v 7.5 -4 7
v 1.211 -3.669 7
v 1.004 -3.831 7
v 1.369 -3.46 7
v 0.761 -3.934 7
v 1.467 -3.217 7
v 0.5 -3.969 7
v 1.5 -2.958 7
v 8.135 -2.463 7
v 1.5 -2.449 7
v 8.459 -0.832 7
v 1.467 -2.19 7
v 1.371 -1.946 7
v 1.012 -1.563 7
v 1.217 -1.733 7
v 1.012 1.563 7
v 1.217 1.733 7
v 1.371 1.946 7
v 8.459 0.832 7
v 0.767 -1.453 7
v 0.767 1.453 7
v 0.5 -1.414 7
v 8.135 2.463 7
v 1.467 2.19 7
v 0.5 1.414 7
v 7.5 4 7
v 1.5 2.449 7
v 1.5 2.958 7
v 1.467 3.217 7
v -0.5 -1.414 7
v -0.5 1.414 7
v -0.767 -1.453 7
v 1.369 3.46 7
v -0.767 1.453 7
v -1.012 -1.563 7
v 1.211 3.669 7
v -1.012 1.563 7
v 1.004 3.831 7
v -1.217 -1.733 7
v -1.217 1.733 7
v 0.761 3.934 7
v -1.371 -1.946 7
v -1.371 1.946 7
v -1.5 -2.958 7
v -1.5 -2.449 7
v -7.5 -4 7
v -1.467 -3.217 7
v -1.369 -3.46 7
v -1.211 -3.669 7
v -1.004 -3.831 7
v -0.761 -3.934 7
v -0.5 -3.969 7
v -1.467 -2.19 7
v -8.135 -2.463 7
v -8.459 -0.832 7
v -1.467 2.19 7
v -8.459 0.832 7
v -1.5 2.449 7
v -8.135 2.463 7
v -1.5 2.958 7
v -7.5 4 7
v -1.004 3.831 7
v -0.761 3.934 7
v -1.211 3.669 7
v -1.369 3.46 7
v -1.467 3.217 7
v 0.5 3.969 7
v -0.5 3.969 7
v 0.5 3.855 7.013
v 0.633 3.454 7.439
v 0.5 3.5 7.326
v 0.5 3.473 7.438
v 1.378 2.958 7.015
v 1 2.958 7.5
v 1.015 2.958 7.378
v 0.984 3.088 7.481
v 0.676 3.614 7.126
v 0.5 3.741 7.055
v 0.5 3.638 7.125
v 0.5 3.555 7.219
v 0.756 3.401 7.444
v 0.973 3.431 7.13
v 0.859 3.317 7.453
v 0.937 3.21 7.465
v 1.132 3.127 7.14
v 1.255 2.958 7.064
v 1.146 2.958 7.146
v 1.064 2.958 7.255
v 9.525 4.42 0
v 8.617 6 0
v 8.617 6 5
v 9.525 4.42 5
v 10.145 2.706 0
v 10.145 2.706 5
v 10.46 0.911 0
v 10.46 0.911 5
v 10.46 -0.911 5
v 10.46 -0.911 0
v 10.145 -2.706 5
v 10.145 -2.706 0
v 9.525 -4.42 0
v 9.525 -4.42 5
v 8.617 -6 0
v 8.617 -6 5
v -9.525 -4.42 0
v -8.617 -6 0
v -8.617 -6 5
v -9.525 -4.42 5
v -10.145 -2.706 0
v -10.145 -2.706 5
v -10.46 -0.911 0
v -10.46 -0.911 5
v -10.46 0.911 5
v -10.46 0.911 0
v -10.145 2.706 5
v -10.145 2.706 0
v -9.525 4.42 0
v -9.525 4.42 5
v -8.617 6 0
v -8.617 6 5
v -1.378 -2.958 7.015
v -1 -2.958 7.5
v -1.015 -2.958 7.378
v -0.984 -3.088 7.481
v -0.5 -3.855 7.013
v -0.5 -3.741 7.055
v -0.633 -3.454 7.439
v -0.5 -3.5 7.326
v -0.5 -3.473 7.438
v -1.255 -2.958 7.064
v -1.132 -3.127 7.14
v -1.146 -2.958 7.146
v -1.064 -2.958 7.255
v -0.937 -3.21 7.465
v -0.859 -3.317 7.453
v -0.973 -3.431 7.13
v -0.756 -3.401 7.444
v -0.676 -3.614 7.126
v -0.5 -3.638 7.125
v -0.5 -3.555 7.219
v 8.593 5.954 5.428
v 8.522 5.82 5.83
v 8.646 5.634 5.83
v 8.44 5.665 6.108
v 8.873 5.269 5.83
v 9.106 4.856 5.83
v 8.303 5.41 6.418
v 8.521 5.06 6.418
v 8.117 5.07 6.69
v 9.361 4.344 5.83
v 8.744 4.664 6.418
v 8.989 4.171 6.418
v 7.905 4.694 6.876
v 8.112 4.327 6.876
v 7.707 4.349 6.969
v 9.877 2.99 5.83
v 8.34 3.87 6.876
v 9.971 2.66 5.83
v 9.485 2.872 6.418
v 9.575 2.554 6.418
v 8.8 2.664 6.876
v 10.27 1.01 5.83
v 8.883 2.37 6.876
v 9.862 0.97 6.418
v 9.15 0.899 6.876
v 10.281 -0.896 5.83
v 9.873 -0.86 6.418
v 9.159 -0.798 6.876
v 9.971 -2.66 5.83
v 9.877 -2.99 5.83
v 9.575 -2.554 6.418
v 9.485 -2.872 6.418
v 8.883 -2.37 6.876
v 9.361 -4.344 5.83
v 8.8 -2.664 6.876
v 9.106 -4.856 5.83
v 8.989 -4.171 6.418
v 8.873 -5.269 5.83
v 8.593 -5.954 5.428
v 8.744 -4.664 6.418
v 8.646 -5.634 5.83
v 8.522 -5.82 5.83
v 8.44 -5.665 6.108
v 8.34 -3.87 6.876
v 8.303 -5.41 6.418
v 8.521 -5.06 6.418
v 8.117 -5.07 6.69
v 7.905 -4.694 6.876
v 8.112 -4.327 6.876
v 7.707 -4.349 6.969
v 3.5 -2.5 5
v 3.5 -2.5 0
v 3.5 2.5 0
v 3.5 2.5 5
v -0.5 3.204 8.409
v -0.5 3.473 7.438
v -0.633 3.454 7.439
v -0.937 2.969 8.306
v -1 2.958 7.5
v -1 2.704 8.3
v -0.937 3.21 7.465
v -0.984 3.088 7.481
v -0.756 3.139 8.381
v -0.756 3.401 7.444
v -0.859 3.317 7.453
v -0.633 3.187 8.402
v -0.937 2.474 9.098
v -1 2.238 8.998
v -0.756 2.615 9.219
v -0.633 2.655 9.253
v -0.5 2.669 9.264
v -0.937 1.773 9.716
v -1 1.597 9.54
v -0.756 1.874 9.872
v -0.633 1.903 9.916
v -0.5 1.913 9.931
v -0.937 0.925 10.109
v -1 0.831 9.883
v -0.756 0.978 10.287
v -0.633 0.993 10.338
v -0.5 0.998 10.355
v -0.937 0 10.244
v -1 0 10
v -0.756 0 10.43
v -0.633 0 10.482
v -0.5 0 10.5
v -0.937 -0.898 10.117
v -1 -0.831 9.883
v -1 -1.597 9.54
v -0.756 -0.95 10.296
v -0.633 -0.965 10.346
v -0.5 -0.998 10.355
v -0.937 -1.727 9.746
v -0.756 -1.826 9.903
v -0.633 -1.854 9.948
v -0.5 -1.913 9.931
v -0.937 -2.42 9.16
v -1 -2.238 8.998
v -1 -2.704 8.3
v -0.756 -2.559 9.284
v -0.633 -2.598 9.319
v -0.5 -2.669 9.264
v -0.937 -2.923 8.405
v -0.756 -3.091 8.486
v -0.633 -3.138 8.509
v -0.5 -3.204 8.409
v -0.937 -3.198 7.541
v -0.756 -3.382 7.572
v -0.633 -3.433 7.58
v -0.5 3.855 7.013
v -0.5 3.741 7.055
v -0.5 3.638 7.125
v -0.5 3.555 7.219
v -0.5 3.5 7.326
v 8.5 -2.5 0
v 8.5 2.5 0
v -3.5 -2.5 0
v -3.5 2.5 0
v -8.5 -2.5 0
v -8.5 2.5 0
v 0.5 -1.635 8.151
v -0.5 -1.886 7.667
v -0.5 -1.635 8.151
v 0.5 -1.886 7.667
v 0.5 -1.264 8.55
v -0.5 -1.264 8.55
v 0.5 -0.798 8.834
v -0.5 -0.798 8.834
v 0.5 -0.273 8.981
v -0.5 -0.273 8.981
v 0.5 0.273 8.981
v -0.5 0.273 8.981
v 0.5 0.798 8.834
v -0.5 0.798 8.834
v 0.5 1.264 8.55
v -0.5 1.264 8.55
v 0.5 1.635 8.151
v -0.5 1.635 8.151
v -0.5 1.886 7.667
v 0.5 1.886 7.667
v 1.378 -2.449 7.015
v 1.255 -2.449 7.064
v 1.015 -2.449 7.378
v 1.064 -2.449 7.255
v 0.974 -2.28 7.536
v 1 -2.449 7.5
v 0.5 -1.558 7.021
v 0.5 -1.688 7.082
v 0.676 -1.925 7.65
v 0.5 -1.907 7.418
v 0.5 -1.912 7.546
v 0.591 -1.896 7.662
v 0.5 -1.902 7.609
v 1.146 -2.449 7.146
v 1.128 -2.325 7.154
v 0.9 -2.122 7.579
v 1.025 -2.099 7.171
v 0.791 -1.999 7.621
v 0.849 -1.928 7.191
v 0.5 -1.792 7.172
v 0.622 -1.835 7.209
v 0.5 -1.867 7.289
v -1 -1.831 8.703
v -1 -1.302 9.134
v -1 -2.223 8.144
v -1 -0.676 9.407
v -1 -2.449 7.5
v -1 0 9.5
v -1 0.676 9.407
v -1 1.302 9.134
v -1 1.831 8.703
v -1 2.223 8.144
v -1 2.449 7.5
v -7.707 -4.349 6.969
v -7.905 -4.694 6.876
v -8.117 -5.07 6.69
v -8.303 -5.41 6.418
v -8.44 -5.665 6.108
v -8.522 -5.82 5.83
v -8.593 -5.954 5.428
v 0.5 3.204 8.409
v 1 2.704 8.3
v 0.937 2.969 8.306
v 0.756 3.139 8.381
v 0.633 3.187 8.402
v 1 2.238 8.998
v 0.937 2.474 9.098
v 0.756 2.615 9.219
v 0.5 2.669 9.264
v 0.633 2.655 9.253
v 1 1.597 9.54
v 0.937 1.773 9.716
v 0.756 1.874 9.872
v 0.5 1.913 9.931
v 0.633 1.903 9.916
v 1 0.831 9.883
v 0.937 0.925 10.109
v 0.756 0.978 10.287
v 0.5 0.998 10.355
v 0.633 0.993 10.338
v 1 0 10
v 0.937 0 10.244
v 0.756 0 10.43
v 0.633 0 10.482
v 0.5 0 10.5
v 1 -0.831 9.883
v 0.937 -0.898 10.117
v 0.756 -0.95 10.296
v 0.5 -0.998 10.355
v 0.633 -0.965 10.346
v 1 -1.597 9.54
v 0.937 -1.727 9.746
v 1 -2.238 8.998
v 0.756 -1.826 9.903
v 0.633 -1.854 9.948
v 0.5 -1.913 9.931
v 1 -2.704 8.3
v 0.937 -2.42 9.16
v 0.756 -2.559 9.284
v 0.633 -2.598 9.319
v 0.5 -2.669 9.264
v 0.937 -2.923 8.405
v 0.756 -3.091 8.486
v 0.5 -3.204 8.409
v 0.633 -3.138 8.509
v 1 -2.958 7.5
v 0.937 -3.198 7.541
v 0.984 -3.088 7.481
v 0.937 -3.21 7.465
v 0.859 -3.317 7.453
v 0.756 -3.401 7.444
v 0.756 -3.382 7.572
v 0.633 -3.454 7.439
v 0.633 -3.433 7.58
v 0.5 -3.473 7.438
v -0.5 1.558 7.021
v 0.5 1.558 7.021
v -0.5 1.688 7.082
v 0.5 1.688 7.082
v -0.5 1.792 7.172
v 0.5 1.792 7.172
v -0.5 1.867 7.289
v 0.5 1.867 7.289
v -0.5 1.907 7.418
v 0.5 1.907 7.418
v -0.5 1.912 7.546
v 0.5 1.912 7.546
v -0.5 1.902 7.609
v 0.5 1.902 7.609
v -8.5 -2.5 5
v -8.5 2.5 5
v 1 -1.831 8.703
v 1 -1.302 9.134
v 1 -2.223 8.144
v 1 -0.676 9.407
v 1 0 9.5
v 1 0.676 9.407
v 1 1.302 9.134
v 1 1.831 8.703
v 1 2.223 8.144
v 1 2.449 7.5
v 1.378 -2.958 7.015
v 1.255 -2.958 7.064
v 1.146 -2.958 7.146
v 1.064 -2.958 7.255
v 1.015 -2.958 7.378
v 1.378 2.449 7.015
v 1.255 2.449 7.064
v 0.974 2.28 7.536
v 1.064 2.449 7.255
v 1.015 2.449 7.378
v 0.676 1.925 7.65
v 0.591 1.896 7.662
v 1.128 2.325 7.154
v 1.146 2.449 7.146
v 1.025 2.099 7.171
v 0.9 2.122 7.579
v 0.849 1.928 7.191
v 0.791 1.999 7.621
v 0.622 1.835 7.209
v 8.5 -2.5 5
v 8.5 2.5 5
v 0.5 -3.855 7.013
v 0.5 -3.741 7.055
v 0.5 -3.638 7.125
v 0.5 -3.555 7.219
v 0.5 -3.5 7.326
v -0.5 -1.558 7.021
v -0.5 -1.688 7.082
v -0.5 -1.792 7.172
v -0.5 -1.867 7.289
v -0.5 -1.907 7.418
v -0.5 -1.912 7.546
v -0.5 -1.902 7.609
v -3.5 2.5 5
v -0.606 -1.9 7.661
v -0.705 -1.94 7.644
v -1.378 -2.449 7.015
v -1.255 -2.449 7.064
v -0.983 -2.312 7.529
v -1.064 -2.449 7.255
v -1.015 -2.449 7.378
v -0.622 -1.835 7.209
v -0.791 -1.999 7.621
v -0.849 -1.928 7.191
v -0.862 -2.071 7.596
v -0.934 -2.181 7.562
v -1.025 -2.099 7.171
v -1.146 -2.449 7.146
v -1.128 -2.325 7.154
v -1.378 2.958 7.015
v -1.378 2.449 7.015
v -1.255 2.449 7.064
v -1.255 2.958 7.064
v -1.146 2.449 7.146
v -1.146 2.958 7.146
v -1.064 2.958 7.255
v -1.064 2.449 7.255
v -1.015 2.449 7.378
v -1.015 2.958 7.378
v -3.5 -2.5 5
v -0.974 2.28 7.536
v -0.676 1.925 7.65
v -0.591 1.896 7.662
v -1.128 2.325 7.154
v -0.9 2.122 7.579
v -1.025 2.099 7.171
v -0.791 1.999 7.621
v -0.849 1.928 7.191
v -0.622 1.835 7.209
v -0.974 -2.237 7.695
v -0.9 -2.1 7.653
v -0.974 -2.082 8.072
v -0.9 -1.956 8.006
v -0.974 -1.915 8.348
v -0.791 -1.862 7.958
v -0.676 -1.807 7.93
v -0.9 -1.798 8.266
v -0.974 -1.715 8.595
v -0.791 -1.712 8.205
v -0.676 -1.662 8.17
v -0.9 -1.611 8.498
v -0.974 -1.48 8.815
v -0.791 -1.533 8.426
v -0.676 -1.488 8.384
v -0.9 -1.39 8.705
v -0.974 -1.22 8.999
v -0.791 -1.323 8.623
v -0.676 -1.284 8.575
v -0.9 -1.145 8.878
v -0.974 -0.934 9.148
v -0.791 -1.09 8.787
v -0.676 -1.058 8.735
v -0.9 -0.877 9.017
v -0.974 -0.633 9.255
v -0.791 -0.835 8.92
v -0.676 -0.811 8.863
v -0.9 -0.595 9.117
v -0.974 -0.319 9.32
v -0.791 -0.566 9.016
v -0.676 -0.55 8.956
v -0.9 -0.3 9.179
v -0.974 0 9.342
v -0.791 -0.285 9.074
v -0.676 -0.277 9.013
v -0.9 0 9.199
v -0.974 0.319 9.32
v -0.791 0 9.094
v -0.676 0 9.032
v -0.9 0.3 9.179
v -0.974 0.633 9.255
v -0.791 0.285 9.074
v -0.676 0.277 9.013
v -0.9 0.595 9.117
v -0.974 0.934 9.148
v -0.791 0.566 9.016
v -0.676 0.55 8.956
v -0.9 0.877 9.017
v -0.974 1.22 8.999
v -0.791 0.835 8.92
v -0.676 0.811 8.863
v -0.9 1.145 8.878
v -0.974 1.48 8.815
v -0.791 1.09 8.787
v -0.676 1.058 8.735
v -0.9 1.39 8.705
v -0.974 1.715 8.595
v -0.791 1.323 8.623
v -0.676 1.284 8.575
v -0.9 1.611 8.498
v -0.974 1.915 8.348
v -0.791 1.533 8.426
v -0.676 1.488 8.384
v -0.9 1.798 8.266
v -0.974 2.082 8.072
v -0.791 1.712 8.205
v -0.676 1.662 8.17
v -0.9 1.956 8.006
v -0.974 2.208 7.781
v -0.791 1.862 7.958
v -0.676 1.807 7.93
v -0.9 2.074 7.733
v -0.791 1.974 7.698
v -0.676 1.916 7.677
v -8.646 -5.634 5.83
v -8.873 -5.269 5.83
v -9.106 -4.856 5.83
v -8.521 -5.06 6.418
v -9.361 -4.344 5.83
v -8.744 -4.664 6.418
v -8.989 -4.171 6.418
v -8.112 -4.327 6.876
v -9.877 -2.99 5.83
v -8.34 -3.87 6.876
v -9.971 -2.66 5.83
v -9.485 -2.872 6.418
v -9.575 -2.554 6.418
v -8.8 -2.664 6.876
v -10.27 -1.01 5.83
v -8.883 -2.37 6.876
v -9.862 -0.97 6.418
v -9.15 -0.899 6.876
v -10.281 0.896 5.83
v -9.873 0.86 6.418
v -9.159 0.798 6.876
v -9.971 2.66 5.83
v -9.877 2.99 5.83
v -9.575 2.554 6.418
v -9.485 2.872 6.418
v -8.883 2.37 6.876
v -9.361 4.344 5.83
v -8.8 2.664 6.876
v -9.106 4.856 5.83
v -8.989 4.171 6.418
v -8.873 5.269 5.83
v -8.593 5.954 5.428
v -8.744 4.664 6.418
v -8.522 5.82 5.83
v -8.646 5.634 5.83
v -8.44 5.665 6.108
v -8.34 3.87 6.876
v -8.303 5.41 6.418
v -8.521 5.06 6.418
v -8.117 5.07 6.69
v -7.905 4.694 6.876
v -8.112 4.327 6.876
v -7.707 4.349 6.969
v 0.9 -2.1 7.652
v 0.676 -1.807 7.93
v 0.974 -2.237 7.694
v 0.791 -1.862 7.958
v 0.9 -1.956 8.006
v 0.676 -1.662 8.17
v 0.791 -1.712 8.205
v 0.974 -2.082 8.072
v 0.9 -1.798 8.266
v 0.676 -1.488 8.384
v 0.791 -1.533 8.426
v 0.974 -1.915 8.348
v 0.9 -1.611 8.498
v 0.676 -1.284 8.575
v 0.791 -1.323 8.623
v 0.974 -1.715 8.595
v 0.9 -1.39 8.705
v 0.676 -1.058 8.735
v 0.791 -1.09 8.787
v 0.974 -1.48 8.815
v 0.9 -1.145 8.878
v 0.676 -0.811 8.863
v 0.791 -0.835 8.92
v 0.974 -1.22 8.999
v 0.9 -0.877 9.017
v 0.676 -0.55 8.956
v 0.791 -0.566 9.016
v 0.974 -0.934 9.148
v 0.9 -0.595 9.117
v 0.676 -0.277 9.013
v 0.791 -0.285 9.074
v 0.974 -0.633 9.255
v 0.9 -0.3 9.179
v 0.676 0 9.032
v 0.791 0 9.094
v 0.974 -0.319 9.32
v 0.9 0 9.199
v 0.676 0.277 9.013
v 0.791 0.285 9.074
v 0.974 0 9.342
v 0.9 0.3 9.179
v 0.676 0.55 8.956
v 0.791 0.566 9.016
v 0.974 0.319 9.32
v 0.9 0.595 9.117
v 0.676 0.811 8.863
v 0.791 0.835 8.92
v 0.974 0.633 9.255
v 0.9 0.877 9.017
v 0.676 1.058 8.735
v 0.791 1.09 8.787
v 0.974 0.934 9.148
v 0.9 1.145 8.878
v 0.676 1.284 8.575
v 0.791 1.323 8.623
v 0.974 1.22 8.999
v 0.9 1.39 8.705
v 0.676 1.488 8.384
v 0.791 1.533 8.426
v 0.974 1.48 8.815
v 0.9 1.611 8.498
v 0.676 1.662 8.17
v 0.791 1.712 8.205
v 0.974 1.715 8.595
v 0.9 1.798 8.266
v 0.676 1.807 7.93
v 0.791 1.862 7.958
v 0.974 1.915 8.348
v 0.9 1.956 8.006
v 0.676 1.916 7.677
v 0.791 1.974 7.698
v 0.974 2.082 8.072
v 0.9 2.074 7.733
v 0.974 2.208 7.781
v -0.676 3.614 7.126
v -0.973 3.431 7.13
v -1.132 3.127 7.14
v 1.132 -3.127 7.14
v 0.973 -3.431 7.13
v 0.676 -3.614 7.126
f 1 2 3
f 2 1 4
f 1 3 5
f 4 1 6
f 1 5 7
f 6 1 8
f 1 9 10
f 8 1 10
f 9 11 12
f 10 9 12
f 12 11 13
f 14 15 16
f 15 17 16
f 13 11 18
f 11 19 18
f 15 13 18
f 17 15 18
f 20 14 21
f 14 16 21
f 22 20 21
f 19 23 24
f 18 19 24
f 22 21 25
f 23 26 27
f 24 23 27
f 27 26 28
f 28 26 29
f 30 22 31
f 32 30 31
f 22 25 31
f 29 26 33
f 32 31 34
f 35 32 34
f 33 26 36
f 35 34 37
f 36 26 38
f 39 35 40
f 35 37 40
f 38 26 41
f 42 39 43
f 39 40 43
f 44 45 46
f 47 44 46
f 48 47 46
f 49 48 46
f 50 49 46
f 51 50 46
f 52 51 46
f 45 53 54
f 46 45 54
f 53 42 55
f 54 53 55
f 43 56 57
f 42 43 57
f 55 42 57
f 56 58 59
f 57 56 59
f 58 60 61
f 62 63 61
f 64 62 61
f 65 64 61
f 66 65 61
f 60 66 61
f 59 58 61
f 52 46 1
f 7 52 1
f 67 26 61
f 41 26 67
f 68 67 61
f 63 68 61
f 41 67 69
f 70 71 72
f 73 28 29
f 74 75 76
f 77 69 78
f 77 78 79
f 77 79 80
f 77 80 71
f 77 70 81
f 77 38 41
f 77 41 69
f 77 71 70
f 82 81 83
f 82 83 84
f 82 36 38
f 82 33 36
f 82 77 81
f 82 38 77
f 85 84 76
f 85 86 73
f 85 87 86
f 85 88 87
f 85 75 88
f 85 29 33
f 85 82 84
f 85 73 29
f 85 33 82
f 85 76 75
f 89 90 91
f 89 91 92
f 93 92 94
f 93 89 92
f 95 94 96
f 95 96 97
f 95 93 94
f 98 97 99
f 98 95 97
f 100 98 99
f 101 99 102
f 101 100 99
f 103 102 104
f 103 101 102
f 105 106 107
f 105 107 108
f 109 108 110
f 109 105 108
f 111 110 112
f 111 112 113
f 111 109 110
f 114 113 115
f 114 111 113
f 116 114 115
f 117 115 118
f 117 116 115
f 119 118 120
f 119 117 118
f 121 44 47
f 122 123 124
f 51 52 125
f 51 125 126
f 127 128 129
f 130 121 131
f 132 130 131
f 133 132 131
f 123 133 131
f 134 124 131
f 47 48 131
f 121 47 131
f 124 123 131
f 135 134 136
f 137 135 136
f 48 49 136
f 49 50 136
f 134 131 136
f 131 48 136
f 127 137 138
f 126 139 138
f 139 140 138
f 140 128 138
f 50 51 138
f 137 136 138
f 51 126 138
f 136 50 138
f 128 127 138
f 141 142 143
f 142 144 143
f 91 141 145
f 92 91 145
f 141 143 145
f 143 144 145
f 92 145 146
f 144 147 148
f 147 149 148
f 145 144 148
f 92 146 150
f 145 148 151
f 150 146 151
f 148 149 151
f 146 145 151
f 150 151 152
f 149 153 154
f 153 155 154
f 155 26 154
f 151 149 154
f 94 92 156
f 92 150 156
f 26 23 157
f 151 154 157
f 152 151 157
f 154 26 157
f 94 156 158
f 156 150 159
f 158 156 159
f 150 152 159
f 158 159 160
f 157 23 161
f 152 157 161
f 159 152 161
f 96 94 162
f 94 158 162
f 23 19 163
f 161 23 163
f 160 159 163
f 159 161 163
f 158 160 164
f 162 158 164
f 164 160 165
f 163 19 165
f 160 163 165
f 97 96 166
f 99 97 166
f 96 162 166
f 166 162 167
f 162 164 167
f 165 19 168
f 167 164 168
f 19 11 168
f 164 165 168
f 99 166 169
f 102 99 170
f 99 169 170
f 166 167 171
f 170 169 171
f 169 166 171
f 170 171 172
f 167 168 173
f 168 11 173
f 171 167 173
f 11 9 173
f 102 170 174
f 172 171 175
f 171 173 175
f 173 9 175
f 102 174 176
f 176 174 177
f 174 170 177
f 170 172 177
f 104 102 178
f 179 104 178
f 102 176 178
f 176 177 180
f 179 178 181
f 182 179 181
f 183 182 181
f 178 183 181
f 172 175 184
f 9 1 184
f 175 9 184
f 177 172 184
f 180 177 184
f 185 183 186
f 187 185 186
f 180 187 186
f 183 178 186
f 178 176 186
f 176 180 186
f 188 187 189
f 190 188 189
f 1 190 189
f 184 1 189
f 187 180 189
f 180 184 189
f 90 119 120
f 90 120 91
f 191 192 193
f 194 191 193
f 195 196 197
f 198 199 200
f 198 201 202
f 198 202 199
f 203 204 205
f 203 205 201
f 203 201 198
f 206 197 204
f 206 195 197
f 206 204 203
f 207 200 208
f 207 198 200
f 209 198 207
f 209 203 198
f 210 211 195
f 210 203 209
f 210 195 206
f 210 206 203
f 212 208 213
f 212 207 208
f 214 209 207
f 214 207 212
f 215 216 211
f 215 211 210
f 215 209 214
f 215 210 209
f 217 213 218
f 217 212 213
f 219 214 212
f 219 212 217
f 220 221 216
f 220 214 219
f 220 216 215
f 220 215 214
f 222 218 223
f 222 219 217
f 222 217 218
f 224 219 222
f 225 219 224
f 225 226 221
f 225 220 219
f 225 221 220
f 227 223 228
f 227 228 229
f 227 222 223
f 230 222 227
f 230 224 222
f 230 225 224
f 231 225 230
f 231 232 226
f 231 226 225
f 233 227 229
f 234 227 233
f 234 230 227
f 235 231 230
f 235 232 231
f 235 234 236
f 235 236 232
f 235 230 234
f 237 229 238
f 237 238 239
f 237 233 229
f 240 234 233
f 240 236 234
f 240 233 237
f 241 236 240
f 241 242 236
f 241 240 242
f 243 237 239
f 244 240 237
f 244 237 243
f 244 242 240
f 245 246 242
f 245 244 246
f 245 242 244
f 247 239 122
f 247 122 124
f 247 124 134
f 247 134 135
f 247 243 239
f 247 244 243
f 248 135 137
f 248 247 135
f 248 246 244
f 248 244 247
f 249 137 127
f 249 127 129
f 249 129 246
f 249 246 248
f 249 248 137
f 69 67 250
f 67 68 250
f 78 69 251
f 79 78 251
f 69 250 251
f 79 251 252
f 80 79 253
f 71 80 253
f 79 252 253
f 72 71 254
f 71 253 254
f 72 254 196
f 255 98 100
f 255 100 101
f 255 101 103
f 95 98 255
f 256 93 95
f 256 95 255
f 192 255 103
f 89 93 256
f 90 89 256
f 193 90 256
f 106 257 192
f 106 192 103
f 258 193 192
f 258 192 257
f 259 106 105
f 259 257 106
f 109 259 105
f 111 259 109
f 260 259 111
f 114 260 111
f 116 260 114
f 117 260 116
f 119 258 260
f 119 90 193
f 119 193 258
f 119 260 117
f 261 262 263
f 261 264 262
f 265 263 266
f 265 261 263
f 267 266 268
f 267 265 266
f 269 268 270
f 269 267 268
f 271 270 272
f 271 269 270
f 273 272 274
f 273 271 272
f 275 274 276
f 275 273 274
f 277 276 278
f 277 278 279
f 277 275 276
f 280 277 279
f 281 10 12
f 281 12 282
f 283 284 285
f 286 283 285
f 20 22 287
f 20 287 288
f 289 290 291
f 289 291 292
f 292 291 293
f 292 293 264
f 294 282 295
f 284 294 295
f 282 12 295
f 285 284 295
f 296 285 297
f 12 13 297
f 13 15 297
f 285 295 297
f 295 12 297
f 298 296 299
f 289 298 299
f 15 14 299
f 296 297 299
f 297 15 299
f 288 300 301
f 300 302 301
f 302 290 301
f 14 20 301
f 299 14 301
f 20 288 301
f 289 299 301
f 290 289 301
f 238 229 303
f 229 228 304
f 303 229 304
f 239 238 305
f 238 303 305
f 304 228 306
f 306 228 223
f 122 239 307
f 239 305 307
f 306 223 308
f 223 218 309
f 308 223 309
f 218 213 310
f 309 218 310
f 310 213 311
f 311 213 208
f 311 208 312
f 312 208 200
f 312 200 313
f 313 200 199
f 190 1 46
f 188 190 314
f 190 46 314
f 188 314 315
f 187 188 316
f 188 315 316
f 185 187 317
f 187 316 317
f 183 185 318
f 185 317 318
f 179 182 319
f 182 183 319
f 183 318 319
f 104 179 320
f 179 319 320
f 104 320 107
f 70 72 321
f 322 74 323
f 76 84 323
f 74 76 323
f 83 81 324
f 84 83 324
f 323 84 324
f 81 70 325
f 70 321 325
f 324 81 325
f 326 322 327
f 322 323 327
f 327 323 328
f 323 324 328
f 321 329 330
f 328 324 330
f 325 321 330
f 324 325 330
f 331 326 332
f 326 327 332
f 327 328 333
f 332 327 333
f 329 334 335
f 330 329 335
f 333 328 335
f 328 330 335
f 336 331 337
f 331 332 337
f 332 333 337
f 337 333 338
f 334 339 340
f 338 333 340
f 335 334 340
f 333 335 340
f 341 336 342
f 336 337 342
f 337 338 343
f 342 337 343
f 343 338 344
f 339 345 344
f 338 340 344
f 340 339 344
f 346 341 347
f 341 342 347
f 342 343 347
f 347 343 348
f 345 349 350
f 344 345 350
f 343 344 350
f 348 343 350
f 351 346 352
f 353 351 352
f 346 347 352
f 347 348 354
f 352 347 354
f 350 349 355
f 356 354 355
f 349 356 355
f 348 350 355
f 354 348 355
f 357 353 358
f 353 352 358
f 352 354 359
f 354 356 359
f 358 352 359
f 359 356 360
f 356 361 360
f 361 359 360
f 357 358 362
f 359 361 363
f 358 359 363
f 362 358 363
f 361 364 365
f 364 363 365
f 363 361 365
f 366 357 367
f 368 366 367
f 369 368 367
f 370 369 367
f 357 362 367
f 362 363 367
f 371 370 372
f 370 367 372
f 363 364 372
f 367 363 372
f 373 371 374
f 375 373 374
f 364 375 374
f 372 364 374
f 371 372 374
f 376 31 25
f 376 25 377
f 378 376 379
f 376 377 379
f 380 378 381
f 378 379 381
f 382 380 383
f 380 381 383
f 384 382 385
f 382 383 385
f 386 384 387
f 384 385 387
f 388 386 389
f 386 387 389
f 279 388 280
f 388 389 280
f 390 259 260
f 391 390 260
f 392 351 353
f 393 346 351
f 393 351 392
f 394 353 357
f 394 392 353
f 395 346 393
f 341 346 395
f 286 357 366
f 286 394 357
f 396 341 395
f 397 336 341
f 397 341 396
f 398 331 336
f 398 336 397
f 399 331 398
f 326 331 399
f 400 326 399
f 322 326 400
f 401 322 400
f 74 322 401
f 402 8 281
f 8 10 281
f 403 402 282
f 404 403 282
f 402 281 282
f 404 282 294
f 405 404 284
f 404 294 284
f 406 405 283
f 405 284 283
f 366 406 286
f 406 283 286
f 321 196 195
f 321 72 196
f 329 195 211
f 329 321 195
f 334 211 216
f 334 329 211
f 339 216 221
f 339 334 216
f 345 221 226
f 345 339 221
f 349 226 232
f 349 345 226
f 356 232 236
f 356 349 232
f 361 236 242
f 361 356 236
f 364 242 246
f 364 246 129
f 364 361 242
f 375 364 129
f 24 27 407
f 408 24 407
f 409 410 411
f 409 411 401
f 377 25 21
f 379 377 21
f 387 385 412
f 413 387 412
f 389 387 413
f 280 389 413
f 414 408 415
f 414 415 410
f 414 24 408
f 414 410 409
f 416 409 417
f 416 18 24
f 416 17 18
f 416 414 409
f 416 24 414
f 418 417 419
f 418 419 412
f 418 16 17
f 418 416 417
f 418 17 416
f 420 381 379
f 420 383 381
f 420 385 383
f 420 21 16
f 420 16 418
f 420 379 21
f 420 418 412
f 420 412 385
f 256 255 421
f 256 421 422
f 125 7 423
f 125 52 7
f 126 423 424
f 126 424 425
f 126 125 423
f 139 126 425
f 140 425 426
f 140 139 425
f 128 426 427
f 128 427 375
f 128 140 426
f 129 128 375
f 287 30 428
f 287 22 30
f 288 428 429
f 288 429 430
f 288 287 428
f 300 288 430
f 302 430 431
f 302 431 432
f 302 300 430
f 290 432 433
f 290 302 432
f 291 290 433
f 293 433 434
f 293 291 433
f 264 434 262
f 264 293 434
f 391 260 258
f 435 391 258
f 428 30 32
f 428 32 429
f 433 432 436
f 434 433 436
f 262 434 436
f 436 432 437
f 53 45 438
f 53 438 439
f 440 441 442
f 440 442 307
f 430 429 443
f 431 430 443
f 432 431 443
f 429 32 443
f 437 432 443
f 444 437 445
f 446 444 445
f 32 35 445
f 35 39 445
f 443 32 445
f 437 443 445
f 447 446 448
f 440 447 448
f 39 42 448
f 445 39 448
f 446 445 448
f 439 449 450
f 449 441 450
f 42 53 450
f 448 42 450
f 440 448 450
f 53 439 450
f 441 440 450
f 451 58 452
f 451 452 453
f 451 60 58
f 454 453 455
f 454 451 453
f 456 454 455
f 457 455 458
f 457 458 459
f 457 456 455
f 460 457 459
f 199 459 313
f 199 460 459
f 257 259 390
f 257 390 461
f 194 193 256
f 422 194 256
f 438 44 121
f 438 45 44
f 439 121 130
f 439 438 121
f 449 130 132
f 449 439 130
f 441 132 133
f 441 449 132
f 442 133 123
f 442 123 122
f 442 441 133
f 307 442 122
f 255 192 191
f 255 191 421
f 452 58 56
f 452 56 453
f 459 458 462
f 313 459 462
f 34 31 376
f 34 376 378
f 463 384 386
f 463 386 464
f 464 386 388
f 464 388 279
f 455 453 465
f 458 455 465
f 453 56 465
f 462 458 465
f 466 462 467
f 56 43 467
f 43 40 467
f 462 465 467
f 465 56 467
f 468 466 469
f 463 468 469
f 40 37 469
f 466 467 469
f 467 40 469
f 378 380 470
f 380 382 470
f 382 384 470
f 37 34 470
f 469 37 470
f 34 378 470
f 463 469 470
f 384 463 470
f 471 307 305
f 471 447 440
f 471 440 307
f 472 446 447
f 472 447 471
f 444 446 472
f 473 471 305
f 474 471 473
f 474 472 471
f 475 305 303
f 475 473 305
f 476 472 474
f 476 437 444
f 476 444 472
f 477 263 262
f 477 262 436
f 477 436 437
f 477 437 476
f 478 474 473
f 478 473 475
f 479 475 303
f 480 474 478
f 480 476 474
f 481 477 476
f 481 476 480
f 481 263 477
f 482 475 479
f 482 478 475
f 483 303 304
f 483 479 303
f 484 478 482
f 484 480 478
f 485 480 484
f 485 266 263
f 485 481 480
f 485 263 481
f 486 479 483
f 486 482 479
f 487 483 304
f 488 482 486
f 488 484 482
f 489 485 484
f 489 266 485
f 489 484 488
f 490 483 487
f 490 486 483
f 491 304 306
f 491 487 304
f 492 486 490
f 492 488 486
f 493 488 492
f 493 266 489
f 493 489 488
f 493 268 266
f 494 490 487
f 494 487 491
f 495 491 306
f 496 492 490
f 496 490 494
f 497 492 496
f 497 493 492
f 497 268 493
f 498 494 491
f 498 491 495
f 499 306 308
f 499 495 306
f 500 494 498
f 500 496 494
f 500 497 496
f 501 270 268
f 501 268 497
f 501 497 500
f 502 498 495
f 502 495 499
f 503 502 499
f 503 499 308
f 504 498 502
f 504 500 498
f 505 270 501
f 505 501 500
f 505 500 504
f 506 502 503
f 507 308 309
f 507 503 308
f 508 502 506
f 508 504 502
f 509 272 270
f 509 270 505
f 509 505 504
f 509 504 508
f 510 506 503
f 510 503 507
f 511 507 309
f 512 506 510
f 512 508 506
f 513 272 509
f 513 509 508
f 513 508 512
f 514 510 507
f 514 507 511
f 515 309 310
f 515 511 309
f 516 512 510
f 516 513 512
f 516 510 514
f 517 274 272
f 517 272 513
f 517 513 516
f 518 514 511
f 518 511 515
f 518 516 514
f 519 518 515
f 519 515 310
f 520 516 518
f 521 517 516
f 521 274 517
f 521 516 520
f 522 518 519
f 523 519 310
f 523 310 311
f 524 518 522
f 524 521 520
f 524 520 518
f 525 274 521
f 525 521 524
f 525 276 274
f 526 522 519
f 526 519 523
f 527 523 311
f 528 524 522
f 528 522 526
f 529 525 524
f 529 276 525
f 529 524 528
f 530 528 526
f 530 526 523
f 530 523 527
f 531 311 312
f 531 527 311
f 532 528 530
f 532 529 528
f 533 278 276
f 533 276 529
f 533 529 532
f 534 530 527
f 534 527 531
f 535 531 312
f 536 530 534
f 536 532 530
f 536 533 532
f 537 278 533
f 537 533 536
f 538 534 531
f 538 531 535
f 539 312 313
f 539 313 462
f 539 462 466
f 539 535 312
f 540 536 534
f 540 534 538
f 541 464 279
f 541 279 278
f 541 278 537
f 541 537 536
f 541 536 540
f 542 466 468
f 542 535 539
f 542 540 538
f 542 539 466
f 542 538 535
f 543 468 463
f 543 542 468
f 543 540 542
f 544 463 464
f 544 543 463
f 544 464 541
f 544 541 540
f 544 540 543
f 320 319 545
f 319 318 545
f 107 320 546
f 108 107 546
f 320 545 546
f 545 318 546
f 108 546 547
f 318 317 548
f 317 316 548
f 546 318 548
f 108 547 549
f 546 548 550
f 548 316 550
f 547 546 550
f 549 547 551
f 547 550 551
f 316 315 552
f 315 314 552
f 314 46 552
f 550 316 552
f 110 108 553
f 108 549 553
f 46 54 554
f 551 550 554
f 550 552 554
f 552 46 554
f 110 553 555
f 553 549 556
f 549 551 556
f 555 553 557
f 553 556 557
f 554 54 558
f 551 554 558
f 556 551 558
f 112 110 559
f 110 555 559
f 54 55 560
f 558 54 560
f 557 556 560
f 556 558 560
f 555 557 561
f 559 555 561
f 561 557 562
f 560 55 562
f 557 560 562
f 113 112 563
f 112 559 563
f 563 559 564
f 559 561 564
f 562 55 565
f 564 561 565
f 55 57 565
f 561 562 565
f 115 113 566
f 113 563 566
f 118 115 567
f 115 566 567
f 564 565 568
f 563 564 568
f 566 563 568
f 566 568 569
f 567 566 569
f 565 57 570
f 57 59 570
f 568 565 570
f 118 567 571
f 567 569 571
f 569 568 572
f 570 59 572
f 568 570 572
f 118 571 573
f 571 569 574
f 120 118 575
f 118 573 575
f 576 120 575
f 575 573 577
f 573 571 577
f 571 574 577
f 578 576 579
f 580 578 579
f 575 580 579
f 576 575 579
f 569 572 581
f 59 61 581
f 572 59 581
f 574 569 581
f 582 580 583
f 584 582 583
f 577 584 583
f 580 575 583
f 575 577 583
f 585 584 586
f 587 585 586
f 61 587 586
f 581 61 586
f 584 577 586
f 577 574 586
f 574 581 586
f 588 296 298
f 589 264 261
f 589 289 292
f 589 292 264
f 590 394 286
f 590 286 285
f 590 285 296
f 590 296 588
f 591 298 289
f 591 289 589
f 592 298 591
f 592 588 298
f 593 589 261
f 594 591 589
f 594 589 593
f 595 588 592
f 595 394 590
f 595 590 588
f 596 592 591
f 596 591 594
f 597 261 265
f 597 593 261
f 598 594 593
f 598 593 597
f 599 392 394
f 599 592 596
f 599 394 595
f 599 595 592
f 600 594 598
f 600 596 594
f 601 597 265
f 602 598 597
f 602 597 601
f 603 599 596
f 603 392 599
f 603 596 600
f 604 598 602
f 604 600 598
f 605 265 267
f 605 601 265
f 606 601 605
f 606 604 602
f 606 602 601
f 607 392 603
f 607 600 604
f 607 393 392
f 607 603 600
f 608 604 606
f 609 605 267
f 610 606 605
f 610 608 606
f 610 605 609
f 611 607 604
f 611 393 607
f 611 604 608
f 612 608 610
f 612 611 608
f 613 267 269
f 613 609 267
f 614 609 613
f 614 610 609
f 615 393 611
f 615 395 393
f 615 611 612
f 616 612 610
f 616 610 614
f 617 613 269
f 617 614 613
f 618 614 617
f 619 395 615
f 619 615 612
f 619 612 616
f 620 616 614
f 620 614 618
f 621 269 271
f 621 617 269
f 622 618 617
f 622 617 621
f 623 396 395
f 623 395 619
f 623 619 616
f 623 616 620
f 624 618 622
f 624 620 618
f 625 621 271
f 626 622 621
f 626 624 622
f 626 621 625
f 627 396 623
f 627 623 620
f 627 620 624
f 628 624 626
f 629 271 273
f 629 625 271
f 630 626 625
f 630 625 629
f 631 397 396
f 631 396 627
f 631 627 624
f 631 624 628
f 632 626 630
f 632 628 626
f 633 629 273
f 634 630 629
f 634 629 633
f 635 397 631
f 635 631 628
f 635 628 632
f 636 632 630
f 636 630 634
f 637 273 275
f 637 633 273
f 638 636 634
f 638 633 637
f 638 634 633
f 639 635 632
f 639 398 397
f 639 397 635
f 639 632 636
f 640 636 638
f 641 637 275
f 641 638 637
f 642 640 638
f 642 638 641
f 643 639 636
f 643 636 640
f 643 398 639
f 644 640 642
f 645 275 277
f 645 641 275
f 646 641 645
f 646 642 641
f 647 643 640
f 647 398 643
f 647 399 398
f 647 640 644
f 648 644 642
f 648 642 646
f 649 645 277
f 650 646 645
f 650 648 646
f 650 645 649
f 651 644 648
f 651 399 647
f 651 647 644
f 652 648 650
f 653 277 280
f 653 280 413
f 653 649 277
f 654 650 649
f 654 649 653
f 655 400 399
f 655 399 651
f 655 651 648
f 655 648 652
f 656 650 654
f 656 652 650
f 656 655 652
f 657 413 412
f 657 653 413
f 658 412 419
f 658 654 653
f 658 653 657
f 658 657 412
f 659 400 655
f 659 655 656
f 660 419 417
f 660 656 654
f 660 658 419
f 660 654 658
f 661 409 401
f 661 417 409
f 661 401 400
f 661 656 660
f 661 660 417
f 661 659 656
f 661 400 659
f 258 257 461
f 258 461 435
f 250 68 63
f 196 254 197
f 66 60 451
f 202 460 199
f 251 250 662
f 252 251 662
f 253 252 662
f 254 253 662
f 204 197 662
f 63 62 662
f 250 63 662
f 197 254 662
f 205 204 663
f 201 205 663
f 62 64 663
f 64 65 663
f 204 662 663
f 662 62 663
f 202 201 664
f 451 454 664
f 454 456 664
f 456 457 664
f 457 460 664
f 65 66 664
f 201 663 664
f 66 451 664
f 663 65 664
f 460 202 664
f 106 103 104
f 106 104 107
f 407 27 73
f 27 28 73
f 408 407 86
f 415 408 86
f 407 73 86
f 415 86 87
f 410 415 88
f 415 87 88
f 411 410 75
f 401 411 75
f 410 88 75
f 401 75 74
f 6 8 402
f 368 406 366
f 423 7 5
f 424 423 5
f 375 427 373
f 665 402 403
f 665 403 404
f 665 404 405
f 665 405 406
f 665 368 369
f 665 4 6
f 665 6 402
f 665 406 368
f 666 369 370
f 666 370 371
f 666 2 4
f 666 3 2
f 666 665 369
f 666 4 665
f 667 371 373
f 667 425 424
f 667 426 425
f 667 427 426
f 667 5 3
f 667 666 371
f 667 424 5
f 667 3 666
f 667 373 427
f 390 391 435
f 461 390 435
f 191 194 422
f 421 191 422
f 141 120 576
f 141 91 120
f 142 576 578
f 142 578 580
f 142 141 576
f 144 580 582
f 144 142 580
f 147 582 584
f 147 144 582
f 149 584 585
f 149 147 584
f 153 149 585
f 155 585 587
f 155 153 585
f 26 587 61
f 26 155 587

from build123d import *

# Parameters (mm, degrees)
BOSS_EXTRU_1_DEPTH      = 7
ESQUISSE2_W             = 5
ESQUISSE2_H             = 5
ENL_V_MAT_EXTRU_2_DEPTH = 5
CONG_1_R                = 2
BOSS_EXTRU_2_DEPTH      = 1
CONG_4_R                = 0.5


with BuildPart() as part:
    # Esquisse1 → Boss.-Extru.1 (new body)
    with BuildSketch(Plane.XY):
        with BuildLine():
            Line((-8.61684397, 6), (8.61684397, 6))
            ThreePointArc((8.61684397, 6), (10.5, 0), (8.61684397, -6))
            Line((8.61684397, -6), (-8.61684397, -6))
            ThreePointArc((-8.61684397, -6), (-10.5, 0), (-8.61684397, 6))
        make_face()
    extrude(amount=BOSS_EXTRU_1_DEPTH)

    # Esquisse2 → Enlèv. mat.-Extru.2 (cut)
    with BuildSketch(Plane.XY):
        with Locations((-6, 0)):
            Rectangle(ESQUISSE2_W, ESQUISSE2_H)
        with Locations((6, 0)):
            Rectangle(ESQUISSE2_W, ESQUISSE2_H)
    extrude(amount=ENL_V_MAT_EXTRU_2_DEPTH, mode=Mode.SUBTRACT)

    # Congé1
    cong_1_edges = [part.edges().sort_by_distance(p)[0] for p in [
        (10.5, 0, 7),
        (0, 6, 7),
        (-10.5, 0, 7),
        (0, -6, 7),
    ]]
    fillet(cong_1_edges, radius=CONG_1_R)

    # Esquisse3 → Boss.-Extru.2 (add, symmetric)
    with BuildSketch(Plane(origin=(0, 0, 0), x_dir=(0, 0, -1), z_dir=(1, 0, 0))):
        with BuildLine():
            Line((-7, -3.5), (-7, -2))
            ThreePointArc((-7, -2), (-9, 0), (-7, 2))
            Line((-7, 2), (-7, 3.5))
            ThreePointArc((-7, 3.5), (-10.5, 0), (-7, -3.5))
        make_face()
    extrude(amount=BOSS_EXTRU_2_DEPTH, both=True)

    # Congé4
    cong_4_edges = [part.edges().sort_by_distance(p)[0] for p in [
        (-1, 0, 9),
        (0, -2, 7),
        (-1, 2.75, 7),
        (0, 2, 7),
        (-1, 0, 10.5),
        (0, 3.5, 7),
        (-1, -2.75, 7),
        (0, -3.5, 7),
        (1, 0, 9),
        (1, 2.75, 7),
        (1, 0, 10.5),
        (1, -2.75, 7),
    ]]
    fillet(cong_4_edges, radius=CONG_4_R)


solid = part.part
